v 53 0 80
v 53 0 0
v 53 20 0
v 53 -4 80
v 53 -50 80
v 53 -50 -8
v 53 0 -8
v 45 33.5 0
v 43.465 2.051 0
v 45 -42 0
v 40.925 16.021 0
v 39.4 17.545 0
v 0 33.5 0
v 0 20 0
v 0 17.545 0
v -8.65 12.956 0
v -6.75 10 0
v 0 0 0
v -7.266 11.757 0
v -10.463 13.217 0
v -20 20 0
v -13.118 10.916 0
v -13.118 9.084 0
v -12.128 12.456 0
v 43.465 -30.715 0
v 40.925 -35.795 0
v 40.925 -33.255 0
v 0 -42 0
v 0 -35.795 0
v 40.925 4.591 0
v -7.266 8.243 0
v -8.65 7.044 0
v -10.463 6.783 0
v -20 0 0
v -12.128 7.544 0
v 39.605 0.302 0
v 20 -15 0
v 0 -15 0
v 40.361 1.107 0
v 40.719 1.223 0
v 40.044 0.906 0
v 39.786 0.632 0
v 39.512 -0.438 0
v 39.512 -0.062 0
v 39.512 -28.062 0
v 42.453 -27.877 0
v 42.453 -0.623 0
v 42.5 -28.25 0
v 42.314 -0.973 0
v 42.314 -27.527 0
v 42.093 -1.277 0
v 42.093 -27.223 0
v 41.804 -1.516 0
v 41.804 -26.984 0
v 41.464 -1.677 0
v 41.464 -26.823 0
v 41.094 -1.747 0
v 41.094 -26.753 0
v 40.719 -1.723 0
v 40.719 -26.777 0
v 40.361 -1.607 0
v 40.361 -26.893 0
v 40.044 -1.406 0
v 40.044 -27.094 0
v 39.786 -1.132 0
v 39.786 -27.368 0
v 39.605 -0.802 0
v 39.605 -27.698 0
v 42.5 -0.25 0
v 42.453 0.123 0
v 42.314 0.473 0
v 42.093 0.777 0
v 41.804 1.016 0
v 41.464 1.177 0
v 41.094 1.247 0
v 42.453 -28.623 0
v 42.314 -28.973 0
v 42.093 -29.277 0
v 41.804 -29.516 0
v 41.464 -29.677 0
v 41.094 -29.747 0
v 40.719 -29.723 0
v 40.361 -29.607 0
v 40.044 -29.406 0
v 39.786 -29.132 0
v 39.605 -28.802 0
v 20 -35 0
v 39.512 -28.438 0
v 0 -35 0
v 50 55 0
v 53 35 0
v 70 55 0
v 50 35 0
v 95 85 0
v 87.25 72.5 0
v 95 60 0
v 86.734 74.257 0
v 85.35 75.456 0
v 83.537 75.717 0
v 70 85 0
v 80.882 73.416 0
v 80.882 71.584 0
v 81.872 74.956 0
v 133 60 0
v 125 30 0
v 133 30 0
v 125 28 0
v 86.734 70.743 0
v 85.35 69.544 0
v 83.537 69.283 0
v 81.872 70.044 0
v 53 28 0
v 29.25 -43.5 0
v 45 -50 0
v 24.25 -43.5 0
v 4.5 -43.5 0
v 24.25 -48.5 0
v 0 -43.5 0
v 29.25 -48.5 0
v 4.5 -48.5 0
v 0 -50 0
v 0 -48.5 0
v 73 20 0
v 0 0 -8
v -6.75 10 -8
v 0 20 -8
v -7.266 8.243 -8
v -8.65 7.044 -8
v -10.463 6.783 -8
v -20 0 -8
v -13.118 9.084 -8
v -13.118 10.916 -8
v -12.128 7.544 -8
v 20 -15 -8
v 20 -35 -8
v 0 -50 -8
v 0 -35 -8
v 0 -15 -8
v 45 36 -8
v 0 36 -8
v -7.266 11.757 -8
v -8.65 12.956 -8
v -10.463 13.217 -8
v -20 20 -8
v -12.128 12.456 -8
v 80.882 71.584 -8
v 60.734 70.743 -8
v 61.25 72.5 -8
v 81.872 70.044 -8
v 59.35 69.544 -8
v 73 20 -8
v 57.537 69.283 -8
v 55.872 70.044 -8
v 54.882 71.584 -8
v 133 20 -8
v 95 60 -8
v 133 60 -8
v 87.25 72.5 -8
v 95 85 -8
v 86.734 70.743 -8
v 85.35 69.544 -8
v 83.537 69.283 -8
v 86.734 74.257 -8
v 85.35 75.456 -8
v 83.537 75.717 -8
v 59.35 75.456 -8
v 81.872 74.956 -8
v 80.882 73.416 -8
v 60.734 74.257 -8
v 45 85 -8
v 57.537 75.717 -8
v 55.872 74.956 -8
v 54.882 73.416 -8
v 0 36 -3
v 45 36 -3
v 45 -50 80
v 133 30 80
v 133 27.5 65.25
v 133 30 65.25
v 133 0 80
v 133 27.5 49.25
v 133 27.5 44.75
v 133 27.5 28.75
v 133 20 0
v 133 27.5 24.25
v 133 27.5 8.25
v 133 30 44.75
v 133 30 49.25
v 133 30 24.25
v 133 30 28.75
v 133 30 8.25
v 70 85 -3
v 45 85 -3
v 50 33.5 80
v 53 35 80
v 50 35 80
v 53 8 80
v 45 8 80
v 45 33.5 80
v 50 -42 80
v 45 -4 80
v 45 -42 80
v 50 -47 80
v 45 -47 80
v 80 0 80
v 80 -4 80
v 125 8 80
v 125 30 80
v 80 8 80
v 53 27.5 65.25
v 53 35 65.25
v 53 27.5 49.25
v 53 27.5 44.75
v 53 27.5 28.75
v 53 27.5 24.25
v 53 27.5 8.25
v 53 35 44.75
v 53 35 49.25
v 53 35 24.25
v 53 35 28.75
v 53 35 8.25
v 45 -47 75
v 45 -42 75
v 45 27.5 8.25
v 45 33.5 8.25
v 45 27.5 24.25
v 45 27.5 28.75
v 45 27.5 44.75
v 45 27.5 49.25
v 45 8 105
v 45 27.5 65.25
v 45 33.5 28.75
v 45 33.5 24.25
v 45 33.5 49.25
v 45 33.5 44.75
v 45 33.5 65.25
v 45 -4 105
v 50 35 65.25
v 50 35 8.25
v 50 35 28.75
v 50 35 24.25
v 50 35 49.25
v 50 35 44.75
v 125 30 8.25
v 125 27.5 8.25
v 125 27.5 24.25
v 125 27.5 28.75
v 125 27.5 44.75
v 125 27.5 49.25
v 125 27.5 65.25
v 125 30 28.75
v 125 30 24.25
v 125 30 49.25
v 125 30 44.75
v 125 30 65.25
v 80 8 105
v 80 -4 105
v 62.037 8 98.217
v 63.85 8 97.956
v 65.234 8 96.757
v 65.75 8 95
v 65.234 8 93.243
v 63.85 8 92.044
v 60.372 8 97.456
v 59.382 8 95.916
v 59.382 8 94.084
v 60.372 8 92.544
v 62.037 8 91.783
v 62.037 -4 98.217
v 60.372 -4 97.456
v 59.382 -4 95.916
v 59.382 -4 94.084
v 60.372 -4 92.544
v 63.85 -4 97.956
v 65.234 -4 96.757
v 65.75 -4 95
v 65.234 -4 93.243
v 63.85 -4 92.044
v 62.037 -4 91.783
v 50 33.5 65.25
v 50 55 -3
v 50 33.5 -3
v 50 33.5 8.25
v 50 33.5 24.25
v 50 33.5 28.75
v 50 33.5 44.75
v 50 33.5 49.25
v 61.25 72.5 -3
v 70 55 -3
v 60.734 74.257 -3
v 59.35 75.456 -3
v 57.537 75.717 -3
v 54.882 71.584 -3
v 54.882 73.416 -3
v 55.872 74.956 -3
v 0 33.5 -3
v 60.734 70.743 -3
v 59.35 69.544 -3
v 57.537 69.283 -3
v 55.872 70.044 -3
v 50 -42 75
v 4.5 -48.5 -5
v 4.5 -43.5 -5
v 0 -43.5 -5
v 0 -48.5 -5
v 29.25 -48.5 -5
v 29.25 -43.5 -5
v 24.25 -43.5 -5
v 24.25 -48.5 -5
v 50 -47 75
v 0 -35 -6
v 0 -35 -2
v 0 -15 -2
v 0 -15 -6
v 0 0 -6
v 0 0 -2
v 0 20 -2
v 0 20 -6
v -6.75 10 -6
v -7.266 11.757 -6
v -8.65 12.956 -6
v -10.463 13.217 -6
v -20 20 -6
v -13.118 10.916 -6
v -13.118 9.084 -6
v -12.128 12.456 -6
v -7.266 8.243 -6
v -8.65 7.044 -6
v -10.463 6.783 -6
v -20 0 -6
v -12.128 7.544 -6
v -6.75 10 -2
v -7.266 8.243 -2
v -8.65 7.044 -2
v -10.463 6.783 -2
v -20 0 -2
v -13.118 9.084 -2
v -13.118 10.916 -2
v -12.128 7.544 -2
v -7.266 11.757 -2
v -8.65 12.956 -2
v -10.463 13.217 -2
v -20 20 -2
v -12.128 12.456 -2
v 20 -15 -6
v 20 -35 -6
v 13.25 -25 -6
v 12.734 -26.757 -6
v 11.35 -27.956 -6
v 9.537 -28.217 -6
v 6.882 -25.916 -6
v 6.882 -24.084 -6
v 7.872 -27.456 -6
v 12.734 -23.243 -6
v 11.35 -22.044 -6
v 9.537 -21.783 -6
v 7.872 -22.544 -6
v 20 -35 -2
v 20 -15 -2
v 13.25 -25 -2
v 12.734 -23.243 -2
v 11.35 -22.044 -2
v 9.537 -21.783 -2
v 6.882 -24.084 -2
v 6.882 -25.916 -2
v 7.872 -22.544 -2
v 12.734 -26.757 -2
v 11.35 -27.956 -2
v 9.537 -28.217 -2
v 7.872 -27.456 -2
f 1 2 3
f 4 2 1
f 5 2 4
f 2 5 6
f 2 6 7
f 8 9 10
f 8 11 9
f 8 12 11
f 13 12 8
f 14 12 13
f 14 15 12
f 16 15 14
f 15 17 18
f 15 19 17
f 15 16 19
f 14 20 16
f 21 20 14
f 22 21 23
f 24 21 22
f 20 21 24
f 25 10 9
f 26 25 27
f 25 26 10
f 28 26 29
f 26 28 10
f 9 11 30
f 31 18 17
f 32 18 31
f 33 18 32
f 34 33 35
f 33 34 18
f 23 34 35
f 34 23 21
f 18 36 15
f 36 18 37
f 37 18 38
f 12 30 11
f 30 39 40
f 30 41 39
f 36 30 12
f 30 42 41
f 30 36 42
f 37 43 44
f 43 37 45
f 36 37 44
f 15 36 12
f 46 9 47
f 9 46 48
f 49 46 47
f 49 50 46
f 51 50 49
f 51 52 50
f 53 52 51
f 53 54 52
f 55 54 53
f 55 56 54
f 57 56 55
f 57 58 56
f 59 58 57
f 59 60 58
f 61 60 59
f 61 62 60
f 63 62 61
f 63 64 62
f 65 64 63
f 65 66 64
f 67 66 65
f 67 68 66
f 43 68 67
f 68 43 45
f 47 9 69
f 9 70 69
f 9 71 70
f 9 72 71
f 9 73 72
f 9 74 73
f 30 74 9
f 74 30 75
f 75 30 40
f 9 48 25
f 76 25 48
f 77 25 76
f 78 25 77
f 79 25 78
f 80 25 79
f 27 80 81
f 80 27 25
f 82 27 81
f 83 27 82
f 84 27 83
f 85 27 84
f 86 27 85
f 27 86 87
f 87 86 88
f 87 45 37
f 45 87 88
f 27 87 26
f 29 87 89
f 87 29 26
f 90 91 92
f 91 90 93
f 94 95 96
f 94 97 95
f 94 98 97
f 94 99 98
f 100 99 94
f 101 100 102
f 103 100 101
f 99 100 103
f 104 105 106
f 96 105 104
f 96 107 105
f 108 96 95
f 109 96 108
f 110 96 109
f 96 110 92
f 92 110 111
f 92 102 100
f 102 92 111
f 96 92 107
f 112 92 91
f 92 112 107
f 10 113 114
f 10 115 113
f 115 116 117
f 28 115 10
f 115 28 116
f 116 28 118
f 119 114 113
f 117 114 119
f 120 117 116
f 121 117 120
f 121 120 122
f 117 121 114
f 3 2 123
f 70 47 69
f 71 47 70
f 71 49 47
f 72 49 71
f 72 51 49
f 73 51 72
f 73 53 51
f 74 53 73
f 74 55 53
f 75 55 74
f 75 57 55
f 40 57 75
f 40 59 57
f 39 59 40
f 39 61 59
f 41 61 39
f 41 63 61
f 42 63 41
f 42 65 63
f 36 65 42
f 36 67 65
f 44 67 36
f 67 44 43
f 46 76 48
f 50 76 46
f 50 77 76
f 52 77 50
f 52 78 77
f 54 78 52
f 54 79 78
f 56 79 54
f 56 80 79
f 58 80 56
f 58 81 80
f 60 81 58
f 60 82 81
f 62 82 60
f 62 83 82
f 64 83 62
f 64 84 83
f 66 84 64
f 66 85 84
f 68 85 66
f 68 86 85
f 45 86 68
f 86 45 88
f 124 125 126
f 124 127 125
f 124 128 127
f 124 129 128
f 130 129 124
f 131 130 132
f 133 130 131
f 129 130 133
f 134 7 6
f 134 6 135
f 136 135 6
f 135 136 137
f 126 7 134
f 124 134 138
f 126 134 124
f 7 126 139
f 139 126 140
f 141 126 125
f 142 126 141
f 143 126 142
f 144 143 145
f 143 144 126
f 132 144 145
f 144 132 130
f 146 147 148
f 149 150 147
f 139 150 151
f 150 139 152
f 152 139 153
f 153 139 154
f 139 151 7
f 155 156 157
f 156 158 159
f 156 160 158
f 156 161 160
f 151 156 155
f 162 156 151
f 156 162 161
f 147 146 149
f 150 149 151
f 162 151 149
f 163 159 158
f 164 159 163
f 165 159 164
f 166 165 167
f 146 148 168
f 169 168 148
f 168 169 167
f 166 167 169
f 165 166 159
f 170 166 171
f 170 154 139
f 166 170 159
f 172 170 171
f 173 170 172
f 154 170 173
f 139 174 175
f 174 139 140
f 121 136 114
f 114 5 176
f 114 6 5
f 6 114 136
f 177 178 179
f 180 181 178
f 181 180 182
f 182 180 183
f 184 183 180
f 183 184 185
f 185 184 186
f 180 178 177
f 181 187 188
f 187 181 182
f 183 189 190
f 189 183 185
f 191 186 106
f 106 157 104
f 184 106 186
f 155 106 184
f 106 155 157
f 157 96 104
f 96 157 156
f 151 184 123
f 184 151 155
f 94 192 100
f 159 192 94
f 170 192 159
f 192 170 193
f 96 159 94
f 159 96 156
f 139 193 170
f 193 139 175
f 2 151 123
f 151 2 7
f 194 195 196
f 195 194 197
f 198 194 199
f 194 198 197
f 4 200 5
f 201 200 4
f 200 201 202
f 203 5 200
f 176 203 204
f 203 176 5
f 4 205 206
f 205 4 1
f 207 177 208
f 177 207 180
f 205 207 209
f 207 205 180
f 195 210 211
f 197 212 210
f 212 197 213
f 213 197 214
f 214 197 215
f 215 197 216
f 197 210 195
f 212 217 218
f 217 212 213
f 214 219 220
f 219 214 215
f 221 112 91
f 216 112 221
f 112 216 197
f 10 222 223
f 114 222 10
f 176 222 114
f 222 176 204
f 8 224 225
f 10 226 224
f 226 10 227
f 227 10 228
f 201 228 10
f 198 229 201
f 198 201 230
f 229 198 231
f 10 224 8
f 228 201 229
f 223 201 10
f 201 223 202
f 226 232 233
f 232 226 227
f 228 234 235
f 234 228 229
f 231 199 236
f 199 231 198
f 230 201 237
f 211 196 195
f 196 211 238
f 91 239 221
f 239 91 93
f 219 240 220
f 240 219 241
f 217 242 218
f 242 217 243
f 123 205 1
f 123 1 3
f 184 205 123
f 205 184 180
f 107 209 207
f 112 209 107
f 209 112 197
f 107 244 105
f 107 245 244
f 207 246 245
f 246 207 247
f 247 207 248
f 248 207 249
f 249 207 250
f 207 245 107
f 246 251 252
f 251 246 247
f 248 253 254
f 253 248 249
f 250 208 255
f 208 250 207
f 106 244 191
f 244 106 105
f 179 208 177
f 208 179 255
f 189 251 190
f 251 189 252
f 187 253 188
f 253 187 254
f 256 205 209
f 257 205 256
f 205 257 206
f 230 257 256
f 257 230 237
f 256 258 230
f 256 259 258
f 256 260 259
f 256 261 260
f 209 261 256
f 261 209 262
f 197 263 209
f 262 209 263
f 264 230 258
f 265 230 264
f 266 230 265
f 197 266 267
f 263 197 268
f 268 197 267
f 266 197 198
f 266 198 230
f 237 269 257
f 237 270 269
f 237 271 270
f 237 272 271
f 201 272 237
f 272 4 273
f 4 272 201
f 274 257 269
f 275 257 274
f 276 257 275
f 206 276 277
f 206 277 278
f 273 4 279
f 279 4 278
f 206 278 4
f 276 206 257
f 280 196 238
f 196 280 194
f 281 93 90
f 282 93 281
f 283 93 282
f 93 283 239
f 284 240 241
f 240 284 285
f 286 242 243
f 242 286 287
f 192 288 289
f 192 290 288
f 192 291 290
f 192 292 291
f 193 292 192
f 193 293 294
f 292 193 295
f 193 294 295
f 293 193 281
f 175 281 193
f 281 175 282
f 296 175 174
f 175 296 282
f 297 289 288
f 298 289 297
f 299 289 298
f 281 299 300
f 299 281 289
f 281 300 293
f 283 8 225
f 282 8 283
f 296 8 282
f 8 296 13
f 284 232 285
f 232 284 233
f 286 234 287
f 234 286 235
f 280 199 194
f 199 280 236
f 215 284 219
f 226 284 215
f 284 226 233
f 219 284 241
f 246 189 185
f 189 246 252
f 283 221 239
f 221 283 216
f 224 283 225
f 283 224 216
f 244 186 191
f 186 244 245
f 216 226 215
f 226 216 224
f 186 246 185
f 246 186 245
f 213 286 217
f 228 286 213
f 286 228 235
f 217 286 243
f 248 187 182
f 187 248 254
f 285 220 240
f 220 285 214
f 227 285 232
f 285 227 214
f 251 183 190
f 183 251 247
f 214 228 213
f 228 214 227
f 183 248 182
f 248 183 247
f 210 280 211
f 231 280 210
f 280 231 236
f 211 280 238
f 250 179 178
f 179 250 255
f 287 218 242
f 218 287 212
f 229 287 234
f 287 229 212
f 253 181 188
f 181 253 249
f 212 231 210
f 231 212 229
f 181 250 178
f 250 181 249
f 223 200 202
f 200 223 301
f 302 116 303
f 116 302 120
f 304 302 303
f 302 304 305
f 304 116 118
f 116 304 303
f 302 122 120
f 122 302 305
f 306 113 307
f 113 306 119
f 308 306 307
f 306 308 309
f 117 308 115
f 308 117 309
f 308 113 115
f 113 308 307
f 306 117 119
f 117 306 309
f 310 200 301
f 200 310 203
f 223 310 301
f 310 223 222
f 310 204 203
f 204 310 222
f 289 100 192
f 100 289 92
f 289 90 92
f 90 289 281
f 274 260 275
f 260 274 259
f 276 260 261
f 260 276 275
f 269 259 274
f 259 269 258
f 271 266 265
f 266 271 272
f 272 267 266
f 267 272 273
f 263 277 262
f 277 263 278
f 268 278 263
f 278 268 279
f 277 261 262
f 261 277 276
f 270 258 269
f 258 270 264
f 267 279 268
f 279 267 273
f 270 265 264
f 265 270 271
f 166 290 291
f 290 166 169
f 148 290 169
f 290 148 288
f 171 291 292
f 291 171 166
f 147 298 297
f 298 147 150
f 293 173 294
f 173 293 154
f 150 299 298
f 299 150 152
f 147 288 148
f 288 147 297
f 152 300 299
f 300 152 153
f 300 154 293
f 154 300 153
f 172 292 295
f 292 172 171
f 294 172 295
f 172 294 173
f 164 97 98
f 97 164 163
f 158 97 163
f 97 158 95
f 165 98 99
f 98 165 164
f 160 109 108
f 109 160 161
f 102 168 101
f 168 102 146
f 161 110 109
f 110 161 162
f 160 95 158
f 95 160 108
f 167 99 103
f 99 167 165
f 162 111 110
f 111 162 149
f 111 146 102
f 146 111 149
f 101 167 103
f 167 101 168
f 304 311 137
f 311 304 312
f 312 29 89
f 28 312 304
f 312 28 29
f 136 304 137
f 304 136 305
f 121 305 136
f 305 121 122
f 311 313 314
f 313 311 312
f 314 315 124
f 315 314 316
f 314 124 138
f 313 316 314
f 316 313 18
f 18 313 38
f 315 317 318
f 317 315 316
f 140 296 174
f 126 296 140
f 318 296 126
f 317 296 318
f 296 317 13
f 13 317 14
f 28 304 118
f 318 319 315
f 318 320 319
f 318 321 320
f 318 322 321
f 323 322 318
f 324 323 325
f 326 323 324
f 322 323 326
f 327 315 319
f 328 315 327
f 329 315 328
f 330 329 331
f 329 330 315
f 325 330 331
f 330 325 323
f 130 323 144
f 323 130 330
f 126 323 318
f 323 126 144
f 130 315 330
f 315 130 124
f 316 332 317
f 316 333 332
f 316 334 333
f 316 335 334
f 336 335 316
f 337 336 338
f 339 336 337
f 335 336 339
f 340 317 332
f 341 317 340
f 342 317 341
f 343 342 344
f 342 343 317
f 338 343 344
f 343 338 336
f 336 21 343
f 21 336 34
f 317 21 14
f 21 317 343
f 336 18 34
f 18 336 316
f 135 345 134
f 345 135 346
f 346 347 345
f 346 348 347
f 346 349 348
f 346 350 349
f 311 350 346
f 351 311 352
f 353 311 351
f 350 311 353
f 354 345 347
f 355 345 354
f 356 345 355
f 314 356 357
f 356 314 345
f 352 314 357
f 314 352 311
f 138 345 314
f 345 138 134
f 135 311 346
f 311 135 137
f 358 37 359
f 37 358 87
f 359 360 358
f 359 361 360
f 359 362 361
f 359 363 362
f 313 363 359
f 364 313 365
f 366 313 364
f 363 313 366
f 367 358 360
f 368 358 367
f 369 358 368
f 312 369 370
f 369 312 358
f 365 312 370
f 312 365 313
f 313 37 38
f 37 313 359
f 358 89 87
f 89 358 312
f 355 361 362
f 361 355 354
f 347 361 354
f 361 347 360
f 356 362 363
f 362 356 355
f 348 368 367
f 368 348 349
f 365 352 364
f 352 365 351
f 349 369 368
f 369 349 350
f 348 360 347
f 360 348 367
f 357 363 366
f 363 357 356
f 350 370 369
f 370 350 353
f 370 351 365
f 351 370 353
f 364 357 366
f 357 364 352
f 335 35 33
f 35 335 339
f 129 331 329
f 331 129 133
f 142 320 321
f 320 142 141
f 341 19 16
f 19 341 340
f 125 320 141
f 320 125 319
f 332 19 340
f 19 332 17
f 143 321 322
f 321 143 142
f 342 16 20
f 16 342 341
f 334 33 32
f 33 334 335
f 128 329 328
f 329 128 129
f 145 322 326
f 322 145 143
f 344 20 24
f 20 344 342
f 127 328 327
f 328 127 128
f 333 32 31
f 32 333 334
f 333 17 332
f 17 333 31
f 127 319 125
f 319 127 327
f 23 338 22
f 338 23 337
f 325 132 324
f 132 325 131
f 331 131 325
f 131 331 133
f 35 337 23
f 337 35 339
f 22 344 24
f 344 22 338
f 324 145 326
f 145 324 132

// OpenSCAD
//
//
//accessories = "OFF";
//mode = "PARTS";
//
//
//if (accessories=="ON"){
//	color([222/255,184/255,135/255]) translate([-50,33.5,-3]) board();
//	translate([-10,15,0]) Arduino(0,0,0);
//} 
//if (mode=="EXPLODED"){
//	baseWCuts();
//	translate([-45,-80,30]) backDoor();
//	translate([0,30,30]) frontPanel();
//	translate([0,30,30]) mirror([1,0,0]) frontPanel();
//}
//if (mode=="ASSEMBLED"){
//	baseWCuts();
//	translate([-45,-50,0]) backDoor();
//	frontPanel();
//	mirror([1,0,0]) frontPanel();
//}
//if (mode=="PARTS"){
//	baseWCuts();
//	translate([280,-10,40]) rotate([270,0,0]) frontPanel();
//	translate([-250,0,10]) rotate([270,0,0]) backDoor();
//	translate([230,-10,40]) mirror([1,0,0]) rotate([270,0,0]) frontPanel();
//
//}




///////////////////////////////
/* MAIN CONSTRUCTOR MODULES */
//////////////////////////////

baseRightConnect();


module baseLeftConnect(){
	difference(){
	union(){
		baseLeft();
		translate([0,-35,-8]) cube([20,20,2]);
		translate([0,-35,-2]) cube([20,20,2]);
	}
	translate([-20,0,-8]) cube([20,20,2]);
	translate([-20,0,-2]) cube([20,20,2]);
	translate([10,-25,-8]) cylinder(r=3.25,h=8);
	translate([-10,10,-8]) cylinder(r=3.25,h=8);	
	}
}

module baseRight(){
	difference(){	
		baseWCuts();
		translate([-300,-150,-10]) cube([300,300,300]);
	}
}

module baseRightConnect(){
	difference(){
	union(){
		baseRight();
		translate([-20,0,-8]) cube([20,20,2]);
		translate([-20,0,-2]) cube([20,20,2]);
	}
	translate([0,-35,-8]) cube([20,20,2]);
	translate([0,-35,-2]) cube([20,20,2]);
	translate([10,-25,-8]) cylinder(r=3.25,h=8);
	translate([-10,10,-8]) cylinder(r=3.25,h=8);	
	}
}

module baseLeft(){
	difference(){	
		baseWCuts();
		translate([0,-150,-10]) cube([300,300,300]);
	}
}

//Creates exact front panel with cuts using frontPanelBasic()
module frontPanel(){ 
	difference(){
		translate([-126.5,52,0]) frontPanelBasic();
		baseWCuts();
		translate([-50,33.5,-3]) board();
		translate([65,10,95]) rotate([90,0,0]) cylinder(r=6.5,h=20);
		translate([-58,72.5,-10]) cylinder(r=3.25,h=20);//cuts panel screw holes
		translate([-84,72.5,-10]) cylinder(r=3.25,h=20);
	}
}

//Creates basic block front panel without cuts
module frontPanelBasic(){ 
	union(){
		cube([81.5,8,80]);
		translate([31.5,0,-3]) cube([50,33,8]);
		translate([73.5,-20,-5]) cube([8,20,85]);
		translate([-6.5,-23,0]) cube([8,31,80]);
	}
}

//Creates full base with sides, floor, and all necessary cuts
module baseWCuts(){
	difference(){
		base();
		translate([-50,33.5,-3]) board(); //cuts board
		translate([-10,15,0]) Arduino(0,0,0); //cuts arduino
		translate([-45,-50,0]) backDoor(); //cuts back door
		translate([-70,55,-3]) cube([140,30,3]); //cuts indent in prongs
		translate([-62.5,10,95]) rotate([90,0,0]) cylinder(r=3.25,h=20); //cuts hanger
		translate([62.5,10,95]) rotate([90,0,0]) cylinder(r=3.25,h=20);
		translate([-58,72.5,-10]) cylinder(r=3.25,h=20);//cuts panel screw holes
		translate([-84,72.5,-10]) cylinder(r=3.25,h=20);
		translate([58,72.5,-10]) cylinder(r=3.25,h=20);
		translate([84,72.5,-10]) cylinder(r=3.25,h=20);
		translate([-53,-5,2]) cube([15,15,15]); //cuts arduino extension port
		translate([-50,36.5,-3]) cube([100,20,3]);
	}
}

//Creates simple base with floor and sides
module base(){
	union(){
		translate([-53,-50,-8]) floor();
		translate([-53,-50,0]) sides();
		translate([-80,-4,80]) cube([35,12,25]); //creates top hinges 
		translate([45,-4,80]) cube([35,12,25]);
	}
}

//Creates back door that will fit into slots in the base.
module backDoor(){
	union(){
		cube([90,8,80]);
	
		translate([19.75,1.5,-5]) cube([5,5,5]); //bottom notches
		translate([44.5,1.5,-5]) cube([5,5,5]);
		translate([69.25,1.5,-5]) cube([5,5,5]);
	
		translate([-5,3,75]) cube([5,5,5]);//top notches
		translate([90,3,75]) cube([5,5,5]);
	
		translate([23,0,40]) rotate([90,0,0]) scale([1,1,1.5]) drawtext("metaLab."); //text
	}
}

//Creates walls including slants
module sides(){

	cube([8,85,80]);
	translate([98,0,0]) cube([8,85,80]);
	translate([-80,70,0]) slant();
	translate([186,70,0]) mirror([1,0,0]) slant();

}

//creates slanted L shaped wall
module slant(){
	polyhedron(
	points = [ [0,0,0],[80,0,0],[0,10,0],[8,10,0],[8,8,0], [80,8,0],
				[0,-20,80],[80,-20,80],[0,10,80],[8,10,80],[8,-12,80],
				[80,-12,80] ],

	faces = [ [0,1,5,4,3,2] ,[6,8,9,10,11,7], [2,8,6,0],
				[0,6,7,1], [1,7,11,5], [5,11,10,4], [4,10,9,3],
				[3,9,8,2]]


	);
}

//Creates floor of the enclosure
module floor(){
	union(){
		cube([106,86,8]);
		
		translate([-80,70,0]) cube([80,40,8]);//wings
		translate([106,70,0]) cube([80,40,8]);
	
		translate([-42,85,0]) cube([50,50,8]); //prongs
		translate([98,85,0]) cube([50,50,8]);
		diagonal();
		translate([106,0,0]) mirror([1,0,0]) diagonal();
	}
}

//Creates triangle inlet for floor
module diagonal(){
	polyhedron(
		points = [ [0,50,0],[0,70,0],[-20,70,0],[0,50,8],[0,70,8],[-20,70,8]],
		faces = [ [2,1,0],[3,4,5],[2,0,3,5],[0,1,4,3],[1,2,5,4] ]
	);
}

//Models enclosed circuit board
module board(){
	union(){
		cube([100,3,85]);
		translate([-87.5,-6,11.25]) cube([95,16,16]);//left
		translate([-87.5,-6,31.75]) cube([95,16,16]);
		translate([-87.5,-6,52.25]) cube([95,16,16]);
	
		translate([92.5,-6,11.25]) cube([95,16,16]);//right
		translate([92.5,-6,31.75]) cube([95,16,16]);
		translate([92.5,-6,52.25]) cube([95,16,16]);
	}
}

/////////////////////////
//TEXT DRAWING MODULES//
////////////////////////
//You can ignore these//

module drawtext(text) {
	//Characters
	chars = " !\"#$%&'()*+,-./0123456789:;<=>?@ABCDEFGHIJKLMNOPQRSTUVWXYZ[\\]^_`abcdefghijklmnopqrstuvwxyz{|}";

	//Chracter table defining 5x7 characters
	//Adapted from: http://www.geocities.com/dinceraydin/djlcdsim/chartable.js
	char_table = [ [ 0, 0, 0, 0, 0, 0, 0],
                  [ 4, 0, 4, 4, 4, 4, 4],
                  [ 0, 0, 0, 0,10,10,10],
                  [10,10,31,10,31,10,10],
                  [ 4,30, 5,14,20,15, 4],
                  [ 3,19, 8, 4, 2,25,24],
                  [13,18,21, 8,20,18,12],
                  [ 0, 0, 0, 0, 8, 4,12],
                  [ 2, 4, 8, 8, 8, 4, 2],
                  [ 8, 4, 2, 2, 2, 4, 8],
                  [ 0, 4,21,14,21, 4, 0],
                  [ 0, 4, 4,31, 4, 4, 0],
                  [ 8, 4,12, 0, 0, 0, 0],
                  [ 0, 0, 0,31, 0, 0, 0],
                  [12,12, 0, 0, 0, 0, 0],
                  [ 0,16, 8, 4, 2, 1, 0],
                  [14,17,25,21,19,17,14],
                  [14, 4, 4, 4, 4,12, 4],
                  [31, 8, 4, 2, 1,17,14],
                  [14,17, 1, 2, 4, 2,31],
                  [ 2, 2,31,18,10, 6, 2],
                  [14,17, 1, 1,30,16,31],
                  [14,17,17,30,16, 8, 6],
                  [ 8, 8, 8, 4, 2, 1,31],
                  [14,17,17,14,17,17,14],
                  [12, 2, 1,15,17,17,14],
                  [ 0,12,12, 0,12,12, 0],
                  [ 8, 4,12, 0,12,12, 0],
                  [ 2, 4, 8,16, 8, 4, 2],
                  [ 0, 0,31, 0,31, 0, 0],
                  [16, 8, 4, 2, 4, 8,16],
                  [ 4, 0, 4, 2, 1,17,14],
                  [14,21,21,13, 1,17,14],
                  [17,17,31,17,17,17,14],
                  [30,17,17,30,17,17,30],
                  [14,17,16,16,16,17,14],
                  [30,17,17,17,17,17,30],
                  [31,16,16,30,16,16,31],
                  [16,16,16,30,16,16,31],
                  [15,17,17,23,16,17,14],
                  [17,17,17,31,17,17,17],
                  [14, 4, 4, 4, 4, 4,14],
                  [12,18, 2, 2, 2, 2, 7],
                  [17,18,20,24,20,18,17],
                  [31,16,16,16,16,16,16],
                  [17,17,17,21,21,27,17],
                  [17,17,19,21,25,17,17],
                  [14,17,17,17,17,17,14],
                  [16,16,16,30,17,17,30],
                  [13,18,21,17,17,17,14],
                  [17,18,20,30,17,17,30],
                  [30, 1, 1,14,16,16,15],
                  [ 4, 4, 4, 4, 4, 4,31],
                  [14,17,17,17,17,17,17],
                  [ 4,10,17,17,17,17,17],
                  [10,21,21,21,17,17,17],
                  [17,17,10, 4,10,17,17],
                  [ 4, 4, 4,10,17,17,17],
                  [31,16, 8, 4, 2, 1,31],
                  [14, 8, 8, 8, 8, 8,14],
                  [ 0, 1, 2, 4, 8,16, 0],
                  [14, 2, 2, 2, 2, 2,14],
                  [ 0, 0, 0, 0,17,10, 4],
                  [31, 0, 0, 0, 0, 0, 0],
                  [ 0, 0, 0, 0, 2, 4, 8],
                  [15,17,15, 1,14, 0, 0],
                  [30,17,17,25,22,16,16],
                  [14,17,16,16,14, 0, 0],
                  [15,17,17,19,13, 1, 1],
                  [14,16,31,17,14, 0, 0],
                  [ 8, 8, 8,28, 8, 9, 6],
                  [14, 1,15,17,15, 0, 0],
                  [17,17,17,25,22,16,16],
                  [14, 4, 4, 4,12, 0, 4],
                  [12,18, 2, 2, 2, 6, 2],
                  [18,20,24,20,18,16,16],
                  [14, 4, 4, 4, 4, 4,12],
                  [17,17,21,21,26, 0, 0],
                  [17,17,17,25,22, 0, 0],
                  [14,17,17,17,14, 0, 0],
                  [16,16,30,17,30, 0, 0],
                  [ 1, 1,15,19,13, 0, 0],
                  [16,16,16,25,22, 0, 0],
                  [30, 1,14,16,15, 0, 0],
                  [ 6, 9, 8, 8,28, 8, 8],
                  [13,19,17,17,17, 0, 0],
                  [ 4,10,17,17,17, 0, 0],
                  [10,21,21,17,17, 0, 0],
                  [17,10, 4,10,17, 0, 0],
                  [14, 1,15,17,17, 0, 0],
                  [31, 8, 4, 2,31, 0, 0],
                  [ 2, 4, 4, 8, 4, 4, 2],
                  [ 4, 4, 4, 4, 4, 4, 4],
                  [ 8, 4, 4, 2, 4, 4, 8] ];

	//Binary decode table
	dec_table = [ "00000", "00001", "00010", "00011", "00100", "00101",
  	            "00110", "00111", "01000", "01001", "01010", "01011",
  	            "01100", "01101", "01110", "01111", "10000", "10001",
  	            "10010", "10011", "10100", "10101", "10110", "10111",
	            "11000", "11001", "11010", "11011", "11100", "11101",
	            "11110", "11111" ];

	//Process string one character at a time
	for(itext = [0:len(text)-1]) {
		//Convert character to index
		assign(ichar = search(text[itext],chars,1)[0]) {
			//Decode character - rows
			for(irow = [0:6]) {
				assign(val = dec_table[char_table[ichar][irow]]) {
					//Decode character - cols
					for(icol = [0:4]) {
						assign(bit = search(val[icol],"01",1)[0]) {
							if(bit) {
								//Output cube
								translate([icol + (6*itext), irow, 0])
									cube([1.0001,1.0001,1]);
							}
						}
					}
				}
			}
		}
	}
}


////////////////////////////
//ARDUINO DRAWING MODULES//
///////////////////////////
//You can ignore these//

board_height = 4;

module Arduino(solid_holes, combined_headers, extend_ports)
{
	echo(str("solid_holes: ", solid_holes));
	echo(str("combined_headers: ", combined_headers));
	echo(str("extend_ports: ", extend_ports));

	if (solid_holes == 1)
	{
		echo("solid holes");
		union()
		{
			Board();
			USB(extend_ports);
			PowerPlug(extend_ports);
			FemaleHeaders(combined_headers);
			MaleHeaders();
			ResetButton();
			ATMega();
			MountingHoles();
		}
	}
	else
	{
		echo("regular holes");
		difference()
		{
			union()
			{
				Board();
				USB(extend_ports);
				PowerPlug(extend_ports);
				FemaleHeaders(combined_headers);
				MaleHeaders();
				ResetButton();
				ATMega();
			}
			MountingHoles();
		}
	}
}

module ResetButton()
{
	translate([39, -26, board_height])
	{
		color([0.8, 0.8, 0.8])
		cube([6, 6, 2.2]);
		
		color([0.6, 0.4, 0.2])
		translate([3, 3, 0]) cylinder(r=1.4, h=3.5, $fn=25);
	}
}

module MaleHeaders()
{
	color([0.6, 0.6, 0.6])
	translate([0, 0, board_height])
	{
		translate([0, -7, 0]) cube([7, 5, 9.2]);
		translate([47.5, -26, 0]) cube([5, 7, 9.2]);
	}
}

module ATMega()
{
	color([0.3, 0.3, 0.3])
	translate([14, -39, board_height])
	{
		cube([35.5, 10, 7.5]);
	}
}

module FemaleHeaders(combined)
{
	color([0.3, 0.3, 0.3])
	translate([0, 0, board_height])
	{
		translate([0, -1, 0])
		{
			translate([7, 0, 0])
			{
				if(combined == 1)
				{
					cube([43, 2, 8.2]);
				}
				else
				{
					cube([21, 2, 8.2]);
					translate([22, 0, 0]) cube([21, 2, 8.2]);
				}
			}
		}

		translate([0, -50, 0])
		{
			translate([17, 0, 0])
			{
				if(combined == 1)
				{
					cube([33, 2, 8.2]);
				}
				else
				{
					cube([15.5, 2, 8.2]);
					translate([17.5, 0, 0]) cube([15.5, 2, 8.2]);
				}
			}
		}
	}
}

module PowerPlug(extended)
{
	if(extended == 1)
	{
		translate([-26.893, -47.4929962, board_height])
		color([0.3, 0.3, 0.3])
		cube([24, 9, 11]);
	}
	else
	{
		translate([-16.893, -47.4929962, board_height])
		color([0.3, 0.3, 0.3])
		cube([14, 9, 11]);
	}
}

module USB(extended)
{
	if(extended == 1)
	{
		translate([-31.465, -18.5623962, board_height])
		color([0.8, 0.8, 0.8])
		cube([26, 12, 11]);
	}
	else
	{
		translate([-61.465, -18.5623962, board_height])
		color([0.8, 0.8, 0.8])
		cube([56, 12, 11]);
	}
}


module Board()
{
	color([0, 0.6, 0.8])
	linear_extrude(height = board_height, convexity = 10, twist = 0)
	{
		polygon( points = [ [-15.115, 2.545],
						[49.4, 2.545],
						[50.925, 1.021],
						[50.925, -10.409],
						[53.465, -12.949],
						[53.465, -45.715],
						[50.925, -48.255],
						[50.925, -50.795],
						[-15.115, -50.795] ],
				paths = [[0, 1, 2, 3, 4, 5, 6, 7, 8]],
				convexity = 10);
	}
}

module MountingHoles()
{
	translate([0, 0, -10])
	{
		ArduinoHole(25);
		translate([-1.0929112, -48.4026972, 0]) ArduinoHole(25);
		translate([51, -15.25, 0]) ArduinoHole(25);
		translate([51, -43.25, 0]) ArduinoHole(25);
	}
}

module ArduinoHole(length)
{
	color([0.7, 0.7, 0.7])
	cylinder(r=1.5, h=length, $fn=25);
}
